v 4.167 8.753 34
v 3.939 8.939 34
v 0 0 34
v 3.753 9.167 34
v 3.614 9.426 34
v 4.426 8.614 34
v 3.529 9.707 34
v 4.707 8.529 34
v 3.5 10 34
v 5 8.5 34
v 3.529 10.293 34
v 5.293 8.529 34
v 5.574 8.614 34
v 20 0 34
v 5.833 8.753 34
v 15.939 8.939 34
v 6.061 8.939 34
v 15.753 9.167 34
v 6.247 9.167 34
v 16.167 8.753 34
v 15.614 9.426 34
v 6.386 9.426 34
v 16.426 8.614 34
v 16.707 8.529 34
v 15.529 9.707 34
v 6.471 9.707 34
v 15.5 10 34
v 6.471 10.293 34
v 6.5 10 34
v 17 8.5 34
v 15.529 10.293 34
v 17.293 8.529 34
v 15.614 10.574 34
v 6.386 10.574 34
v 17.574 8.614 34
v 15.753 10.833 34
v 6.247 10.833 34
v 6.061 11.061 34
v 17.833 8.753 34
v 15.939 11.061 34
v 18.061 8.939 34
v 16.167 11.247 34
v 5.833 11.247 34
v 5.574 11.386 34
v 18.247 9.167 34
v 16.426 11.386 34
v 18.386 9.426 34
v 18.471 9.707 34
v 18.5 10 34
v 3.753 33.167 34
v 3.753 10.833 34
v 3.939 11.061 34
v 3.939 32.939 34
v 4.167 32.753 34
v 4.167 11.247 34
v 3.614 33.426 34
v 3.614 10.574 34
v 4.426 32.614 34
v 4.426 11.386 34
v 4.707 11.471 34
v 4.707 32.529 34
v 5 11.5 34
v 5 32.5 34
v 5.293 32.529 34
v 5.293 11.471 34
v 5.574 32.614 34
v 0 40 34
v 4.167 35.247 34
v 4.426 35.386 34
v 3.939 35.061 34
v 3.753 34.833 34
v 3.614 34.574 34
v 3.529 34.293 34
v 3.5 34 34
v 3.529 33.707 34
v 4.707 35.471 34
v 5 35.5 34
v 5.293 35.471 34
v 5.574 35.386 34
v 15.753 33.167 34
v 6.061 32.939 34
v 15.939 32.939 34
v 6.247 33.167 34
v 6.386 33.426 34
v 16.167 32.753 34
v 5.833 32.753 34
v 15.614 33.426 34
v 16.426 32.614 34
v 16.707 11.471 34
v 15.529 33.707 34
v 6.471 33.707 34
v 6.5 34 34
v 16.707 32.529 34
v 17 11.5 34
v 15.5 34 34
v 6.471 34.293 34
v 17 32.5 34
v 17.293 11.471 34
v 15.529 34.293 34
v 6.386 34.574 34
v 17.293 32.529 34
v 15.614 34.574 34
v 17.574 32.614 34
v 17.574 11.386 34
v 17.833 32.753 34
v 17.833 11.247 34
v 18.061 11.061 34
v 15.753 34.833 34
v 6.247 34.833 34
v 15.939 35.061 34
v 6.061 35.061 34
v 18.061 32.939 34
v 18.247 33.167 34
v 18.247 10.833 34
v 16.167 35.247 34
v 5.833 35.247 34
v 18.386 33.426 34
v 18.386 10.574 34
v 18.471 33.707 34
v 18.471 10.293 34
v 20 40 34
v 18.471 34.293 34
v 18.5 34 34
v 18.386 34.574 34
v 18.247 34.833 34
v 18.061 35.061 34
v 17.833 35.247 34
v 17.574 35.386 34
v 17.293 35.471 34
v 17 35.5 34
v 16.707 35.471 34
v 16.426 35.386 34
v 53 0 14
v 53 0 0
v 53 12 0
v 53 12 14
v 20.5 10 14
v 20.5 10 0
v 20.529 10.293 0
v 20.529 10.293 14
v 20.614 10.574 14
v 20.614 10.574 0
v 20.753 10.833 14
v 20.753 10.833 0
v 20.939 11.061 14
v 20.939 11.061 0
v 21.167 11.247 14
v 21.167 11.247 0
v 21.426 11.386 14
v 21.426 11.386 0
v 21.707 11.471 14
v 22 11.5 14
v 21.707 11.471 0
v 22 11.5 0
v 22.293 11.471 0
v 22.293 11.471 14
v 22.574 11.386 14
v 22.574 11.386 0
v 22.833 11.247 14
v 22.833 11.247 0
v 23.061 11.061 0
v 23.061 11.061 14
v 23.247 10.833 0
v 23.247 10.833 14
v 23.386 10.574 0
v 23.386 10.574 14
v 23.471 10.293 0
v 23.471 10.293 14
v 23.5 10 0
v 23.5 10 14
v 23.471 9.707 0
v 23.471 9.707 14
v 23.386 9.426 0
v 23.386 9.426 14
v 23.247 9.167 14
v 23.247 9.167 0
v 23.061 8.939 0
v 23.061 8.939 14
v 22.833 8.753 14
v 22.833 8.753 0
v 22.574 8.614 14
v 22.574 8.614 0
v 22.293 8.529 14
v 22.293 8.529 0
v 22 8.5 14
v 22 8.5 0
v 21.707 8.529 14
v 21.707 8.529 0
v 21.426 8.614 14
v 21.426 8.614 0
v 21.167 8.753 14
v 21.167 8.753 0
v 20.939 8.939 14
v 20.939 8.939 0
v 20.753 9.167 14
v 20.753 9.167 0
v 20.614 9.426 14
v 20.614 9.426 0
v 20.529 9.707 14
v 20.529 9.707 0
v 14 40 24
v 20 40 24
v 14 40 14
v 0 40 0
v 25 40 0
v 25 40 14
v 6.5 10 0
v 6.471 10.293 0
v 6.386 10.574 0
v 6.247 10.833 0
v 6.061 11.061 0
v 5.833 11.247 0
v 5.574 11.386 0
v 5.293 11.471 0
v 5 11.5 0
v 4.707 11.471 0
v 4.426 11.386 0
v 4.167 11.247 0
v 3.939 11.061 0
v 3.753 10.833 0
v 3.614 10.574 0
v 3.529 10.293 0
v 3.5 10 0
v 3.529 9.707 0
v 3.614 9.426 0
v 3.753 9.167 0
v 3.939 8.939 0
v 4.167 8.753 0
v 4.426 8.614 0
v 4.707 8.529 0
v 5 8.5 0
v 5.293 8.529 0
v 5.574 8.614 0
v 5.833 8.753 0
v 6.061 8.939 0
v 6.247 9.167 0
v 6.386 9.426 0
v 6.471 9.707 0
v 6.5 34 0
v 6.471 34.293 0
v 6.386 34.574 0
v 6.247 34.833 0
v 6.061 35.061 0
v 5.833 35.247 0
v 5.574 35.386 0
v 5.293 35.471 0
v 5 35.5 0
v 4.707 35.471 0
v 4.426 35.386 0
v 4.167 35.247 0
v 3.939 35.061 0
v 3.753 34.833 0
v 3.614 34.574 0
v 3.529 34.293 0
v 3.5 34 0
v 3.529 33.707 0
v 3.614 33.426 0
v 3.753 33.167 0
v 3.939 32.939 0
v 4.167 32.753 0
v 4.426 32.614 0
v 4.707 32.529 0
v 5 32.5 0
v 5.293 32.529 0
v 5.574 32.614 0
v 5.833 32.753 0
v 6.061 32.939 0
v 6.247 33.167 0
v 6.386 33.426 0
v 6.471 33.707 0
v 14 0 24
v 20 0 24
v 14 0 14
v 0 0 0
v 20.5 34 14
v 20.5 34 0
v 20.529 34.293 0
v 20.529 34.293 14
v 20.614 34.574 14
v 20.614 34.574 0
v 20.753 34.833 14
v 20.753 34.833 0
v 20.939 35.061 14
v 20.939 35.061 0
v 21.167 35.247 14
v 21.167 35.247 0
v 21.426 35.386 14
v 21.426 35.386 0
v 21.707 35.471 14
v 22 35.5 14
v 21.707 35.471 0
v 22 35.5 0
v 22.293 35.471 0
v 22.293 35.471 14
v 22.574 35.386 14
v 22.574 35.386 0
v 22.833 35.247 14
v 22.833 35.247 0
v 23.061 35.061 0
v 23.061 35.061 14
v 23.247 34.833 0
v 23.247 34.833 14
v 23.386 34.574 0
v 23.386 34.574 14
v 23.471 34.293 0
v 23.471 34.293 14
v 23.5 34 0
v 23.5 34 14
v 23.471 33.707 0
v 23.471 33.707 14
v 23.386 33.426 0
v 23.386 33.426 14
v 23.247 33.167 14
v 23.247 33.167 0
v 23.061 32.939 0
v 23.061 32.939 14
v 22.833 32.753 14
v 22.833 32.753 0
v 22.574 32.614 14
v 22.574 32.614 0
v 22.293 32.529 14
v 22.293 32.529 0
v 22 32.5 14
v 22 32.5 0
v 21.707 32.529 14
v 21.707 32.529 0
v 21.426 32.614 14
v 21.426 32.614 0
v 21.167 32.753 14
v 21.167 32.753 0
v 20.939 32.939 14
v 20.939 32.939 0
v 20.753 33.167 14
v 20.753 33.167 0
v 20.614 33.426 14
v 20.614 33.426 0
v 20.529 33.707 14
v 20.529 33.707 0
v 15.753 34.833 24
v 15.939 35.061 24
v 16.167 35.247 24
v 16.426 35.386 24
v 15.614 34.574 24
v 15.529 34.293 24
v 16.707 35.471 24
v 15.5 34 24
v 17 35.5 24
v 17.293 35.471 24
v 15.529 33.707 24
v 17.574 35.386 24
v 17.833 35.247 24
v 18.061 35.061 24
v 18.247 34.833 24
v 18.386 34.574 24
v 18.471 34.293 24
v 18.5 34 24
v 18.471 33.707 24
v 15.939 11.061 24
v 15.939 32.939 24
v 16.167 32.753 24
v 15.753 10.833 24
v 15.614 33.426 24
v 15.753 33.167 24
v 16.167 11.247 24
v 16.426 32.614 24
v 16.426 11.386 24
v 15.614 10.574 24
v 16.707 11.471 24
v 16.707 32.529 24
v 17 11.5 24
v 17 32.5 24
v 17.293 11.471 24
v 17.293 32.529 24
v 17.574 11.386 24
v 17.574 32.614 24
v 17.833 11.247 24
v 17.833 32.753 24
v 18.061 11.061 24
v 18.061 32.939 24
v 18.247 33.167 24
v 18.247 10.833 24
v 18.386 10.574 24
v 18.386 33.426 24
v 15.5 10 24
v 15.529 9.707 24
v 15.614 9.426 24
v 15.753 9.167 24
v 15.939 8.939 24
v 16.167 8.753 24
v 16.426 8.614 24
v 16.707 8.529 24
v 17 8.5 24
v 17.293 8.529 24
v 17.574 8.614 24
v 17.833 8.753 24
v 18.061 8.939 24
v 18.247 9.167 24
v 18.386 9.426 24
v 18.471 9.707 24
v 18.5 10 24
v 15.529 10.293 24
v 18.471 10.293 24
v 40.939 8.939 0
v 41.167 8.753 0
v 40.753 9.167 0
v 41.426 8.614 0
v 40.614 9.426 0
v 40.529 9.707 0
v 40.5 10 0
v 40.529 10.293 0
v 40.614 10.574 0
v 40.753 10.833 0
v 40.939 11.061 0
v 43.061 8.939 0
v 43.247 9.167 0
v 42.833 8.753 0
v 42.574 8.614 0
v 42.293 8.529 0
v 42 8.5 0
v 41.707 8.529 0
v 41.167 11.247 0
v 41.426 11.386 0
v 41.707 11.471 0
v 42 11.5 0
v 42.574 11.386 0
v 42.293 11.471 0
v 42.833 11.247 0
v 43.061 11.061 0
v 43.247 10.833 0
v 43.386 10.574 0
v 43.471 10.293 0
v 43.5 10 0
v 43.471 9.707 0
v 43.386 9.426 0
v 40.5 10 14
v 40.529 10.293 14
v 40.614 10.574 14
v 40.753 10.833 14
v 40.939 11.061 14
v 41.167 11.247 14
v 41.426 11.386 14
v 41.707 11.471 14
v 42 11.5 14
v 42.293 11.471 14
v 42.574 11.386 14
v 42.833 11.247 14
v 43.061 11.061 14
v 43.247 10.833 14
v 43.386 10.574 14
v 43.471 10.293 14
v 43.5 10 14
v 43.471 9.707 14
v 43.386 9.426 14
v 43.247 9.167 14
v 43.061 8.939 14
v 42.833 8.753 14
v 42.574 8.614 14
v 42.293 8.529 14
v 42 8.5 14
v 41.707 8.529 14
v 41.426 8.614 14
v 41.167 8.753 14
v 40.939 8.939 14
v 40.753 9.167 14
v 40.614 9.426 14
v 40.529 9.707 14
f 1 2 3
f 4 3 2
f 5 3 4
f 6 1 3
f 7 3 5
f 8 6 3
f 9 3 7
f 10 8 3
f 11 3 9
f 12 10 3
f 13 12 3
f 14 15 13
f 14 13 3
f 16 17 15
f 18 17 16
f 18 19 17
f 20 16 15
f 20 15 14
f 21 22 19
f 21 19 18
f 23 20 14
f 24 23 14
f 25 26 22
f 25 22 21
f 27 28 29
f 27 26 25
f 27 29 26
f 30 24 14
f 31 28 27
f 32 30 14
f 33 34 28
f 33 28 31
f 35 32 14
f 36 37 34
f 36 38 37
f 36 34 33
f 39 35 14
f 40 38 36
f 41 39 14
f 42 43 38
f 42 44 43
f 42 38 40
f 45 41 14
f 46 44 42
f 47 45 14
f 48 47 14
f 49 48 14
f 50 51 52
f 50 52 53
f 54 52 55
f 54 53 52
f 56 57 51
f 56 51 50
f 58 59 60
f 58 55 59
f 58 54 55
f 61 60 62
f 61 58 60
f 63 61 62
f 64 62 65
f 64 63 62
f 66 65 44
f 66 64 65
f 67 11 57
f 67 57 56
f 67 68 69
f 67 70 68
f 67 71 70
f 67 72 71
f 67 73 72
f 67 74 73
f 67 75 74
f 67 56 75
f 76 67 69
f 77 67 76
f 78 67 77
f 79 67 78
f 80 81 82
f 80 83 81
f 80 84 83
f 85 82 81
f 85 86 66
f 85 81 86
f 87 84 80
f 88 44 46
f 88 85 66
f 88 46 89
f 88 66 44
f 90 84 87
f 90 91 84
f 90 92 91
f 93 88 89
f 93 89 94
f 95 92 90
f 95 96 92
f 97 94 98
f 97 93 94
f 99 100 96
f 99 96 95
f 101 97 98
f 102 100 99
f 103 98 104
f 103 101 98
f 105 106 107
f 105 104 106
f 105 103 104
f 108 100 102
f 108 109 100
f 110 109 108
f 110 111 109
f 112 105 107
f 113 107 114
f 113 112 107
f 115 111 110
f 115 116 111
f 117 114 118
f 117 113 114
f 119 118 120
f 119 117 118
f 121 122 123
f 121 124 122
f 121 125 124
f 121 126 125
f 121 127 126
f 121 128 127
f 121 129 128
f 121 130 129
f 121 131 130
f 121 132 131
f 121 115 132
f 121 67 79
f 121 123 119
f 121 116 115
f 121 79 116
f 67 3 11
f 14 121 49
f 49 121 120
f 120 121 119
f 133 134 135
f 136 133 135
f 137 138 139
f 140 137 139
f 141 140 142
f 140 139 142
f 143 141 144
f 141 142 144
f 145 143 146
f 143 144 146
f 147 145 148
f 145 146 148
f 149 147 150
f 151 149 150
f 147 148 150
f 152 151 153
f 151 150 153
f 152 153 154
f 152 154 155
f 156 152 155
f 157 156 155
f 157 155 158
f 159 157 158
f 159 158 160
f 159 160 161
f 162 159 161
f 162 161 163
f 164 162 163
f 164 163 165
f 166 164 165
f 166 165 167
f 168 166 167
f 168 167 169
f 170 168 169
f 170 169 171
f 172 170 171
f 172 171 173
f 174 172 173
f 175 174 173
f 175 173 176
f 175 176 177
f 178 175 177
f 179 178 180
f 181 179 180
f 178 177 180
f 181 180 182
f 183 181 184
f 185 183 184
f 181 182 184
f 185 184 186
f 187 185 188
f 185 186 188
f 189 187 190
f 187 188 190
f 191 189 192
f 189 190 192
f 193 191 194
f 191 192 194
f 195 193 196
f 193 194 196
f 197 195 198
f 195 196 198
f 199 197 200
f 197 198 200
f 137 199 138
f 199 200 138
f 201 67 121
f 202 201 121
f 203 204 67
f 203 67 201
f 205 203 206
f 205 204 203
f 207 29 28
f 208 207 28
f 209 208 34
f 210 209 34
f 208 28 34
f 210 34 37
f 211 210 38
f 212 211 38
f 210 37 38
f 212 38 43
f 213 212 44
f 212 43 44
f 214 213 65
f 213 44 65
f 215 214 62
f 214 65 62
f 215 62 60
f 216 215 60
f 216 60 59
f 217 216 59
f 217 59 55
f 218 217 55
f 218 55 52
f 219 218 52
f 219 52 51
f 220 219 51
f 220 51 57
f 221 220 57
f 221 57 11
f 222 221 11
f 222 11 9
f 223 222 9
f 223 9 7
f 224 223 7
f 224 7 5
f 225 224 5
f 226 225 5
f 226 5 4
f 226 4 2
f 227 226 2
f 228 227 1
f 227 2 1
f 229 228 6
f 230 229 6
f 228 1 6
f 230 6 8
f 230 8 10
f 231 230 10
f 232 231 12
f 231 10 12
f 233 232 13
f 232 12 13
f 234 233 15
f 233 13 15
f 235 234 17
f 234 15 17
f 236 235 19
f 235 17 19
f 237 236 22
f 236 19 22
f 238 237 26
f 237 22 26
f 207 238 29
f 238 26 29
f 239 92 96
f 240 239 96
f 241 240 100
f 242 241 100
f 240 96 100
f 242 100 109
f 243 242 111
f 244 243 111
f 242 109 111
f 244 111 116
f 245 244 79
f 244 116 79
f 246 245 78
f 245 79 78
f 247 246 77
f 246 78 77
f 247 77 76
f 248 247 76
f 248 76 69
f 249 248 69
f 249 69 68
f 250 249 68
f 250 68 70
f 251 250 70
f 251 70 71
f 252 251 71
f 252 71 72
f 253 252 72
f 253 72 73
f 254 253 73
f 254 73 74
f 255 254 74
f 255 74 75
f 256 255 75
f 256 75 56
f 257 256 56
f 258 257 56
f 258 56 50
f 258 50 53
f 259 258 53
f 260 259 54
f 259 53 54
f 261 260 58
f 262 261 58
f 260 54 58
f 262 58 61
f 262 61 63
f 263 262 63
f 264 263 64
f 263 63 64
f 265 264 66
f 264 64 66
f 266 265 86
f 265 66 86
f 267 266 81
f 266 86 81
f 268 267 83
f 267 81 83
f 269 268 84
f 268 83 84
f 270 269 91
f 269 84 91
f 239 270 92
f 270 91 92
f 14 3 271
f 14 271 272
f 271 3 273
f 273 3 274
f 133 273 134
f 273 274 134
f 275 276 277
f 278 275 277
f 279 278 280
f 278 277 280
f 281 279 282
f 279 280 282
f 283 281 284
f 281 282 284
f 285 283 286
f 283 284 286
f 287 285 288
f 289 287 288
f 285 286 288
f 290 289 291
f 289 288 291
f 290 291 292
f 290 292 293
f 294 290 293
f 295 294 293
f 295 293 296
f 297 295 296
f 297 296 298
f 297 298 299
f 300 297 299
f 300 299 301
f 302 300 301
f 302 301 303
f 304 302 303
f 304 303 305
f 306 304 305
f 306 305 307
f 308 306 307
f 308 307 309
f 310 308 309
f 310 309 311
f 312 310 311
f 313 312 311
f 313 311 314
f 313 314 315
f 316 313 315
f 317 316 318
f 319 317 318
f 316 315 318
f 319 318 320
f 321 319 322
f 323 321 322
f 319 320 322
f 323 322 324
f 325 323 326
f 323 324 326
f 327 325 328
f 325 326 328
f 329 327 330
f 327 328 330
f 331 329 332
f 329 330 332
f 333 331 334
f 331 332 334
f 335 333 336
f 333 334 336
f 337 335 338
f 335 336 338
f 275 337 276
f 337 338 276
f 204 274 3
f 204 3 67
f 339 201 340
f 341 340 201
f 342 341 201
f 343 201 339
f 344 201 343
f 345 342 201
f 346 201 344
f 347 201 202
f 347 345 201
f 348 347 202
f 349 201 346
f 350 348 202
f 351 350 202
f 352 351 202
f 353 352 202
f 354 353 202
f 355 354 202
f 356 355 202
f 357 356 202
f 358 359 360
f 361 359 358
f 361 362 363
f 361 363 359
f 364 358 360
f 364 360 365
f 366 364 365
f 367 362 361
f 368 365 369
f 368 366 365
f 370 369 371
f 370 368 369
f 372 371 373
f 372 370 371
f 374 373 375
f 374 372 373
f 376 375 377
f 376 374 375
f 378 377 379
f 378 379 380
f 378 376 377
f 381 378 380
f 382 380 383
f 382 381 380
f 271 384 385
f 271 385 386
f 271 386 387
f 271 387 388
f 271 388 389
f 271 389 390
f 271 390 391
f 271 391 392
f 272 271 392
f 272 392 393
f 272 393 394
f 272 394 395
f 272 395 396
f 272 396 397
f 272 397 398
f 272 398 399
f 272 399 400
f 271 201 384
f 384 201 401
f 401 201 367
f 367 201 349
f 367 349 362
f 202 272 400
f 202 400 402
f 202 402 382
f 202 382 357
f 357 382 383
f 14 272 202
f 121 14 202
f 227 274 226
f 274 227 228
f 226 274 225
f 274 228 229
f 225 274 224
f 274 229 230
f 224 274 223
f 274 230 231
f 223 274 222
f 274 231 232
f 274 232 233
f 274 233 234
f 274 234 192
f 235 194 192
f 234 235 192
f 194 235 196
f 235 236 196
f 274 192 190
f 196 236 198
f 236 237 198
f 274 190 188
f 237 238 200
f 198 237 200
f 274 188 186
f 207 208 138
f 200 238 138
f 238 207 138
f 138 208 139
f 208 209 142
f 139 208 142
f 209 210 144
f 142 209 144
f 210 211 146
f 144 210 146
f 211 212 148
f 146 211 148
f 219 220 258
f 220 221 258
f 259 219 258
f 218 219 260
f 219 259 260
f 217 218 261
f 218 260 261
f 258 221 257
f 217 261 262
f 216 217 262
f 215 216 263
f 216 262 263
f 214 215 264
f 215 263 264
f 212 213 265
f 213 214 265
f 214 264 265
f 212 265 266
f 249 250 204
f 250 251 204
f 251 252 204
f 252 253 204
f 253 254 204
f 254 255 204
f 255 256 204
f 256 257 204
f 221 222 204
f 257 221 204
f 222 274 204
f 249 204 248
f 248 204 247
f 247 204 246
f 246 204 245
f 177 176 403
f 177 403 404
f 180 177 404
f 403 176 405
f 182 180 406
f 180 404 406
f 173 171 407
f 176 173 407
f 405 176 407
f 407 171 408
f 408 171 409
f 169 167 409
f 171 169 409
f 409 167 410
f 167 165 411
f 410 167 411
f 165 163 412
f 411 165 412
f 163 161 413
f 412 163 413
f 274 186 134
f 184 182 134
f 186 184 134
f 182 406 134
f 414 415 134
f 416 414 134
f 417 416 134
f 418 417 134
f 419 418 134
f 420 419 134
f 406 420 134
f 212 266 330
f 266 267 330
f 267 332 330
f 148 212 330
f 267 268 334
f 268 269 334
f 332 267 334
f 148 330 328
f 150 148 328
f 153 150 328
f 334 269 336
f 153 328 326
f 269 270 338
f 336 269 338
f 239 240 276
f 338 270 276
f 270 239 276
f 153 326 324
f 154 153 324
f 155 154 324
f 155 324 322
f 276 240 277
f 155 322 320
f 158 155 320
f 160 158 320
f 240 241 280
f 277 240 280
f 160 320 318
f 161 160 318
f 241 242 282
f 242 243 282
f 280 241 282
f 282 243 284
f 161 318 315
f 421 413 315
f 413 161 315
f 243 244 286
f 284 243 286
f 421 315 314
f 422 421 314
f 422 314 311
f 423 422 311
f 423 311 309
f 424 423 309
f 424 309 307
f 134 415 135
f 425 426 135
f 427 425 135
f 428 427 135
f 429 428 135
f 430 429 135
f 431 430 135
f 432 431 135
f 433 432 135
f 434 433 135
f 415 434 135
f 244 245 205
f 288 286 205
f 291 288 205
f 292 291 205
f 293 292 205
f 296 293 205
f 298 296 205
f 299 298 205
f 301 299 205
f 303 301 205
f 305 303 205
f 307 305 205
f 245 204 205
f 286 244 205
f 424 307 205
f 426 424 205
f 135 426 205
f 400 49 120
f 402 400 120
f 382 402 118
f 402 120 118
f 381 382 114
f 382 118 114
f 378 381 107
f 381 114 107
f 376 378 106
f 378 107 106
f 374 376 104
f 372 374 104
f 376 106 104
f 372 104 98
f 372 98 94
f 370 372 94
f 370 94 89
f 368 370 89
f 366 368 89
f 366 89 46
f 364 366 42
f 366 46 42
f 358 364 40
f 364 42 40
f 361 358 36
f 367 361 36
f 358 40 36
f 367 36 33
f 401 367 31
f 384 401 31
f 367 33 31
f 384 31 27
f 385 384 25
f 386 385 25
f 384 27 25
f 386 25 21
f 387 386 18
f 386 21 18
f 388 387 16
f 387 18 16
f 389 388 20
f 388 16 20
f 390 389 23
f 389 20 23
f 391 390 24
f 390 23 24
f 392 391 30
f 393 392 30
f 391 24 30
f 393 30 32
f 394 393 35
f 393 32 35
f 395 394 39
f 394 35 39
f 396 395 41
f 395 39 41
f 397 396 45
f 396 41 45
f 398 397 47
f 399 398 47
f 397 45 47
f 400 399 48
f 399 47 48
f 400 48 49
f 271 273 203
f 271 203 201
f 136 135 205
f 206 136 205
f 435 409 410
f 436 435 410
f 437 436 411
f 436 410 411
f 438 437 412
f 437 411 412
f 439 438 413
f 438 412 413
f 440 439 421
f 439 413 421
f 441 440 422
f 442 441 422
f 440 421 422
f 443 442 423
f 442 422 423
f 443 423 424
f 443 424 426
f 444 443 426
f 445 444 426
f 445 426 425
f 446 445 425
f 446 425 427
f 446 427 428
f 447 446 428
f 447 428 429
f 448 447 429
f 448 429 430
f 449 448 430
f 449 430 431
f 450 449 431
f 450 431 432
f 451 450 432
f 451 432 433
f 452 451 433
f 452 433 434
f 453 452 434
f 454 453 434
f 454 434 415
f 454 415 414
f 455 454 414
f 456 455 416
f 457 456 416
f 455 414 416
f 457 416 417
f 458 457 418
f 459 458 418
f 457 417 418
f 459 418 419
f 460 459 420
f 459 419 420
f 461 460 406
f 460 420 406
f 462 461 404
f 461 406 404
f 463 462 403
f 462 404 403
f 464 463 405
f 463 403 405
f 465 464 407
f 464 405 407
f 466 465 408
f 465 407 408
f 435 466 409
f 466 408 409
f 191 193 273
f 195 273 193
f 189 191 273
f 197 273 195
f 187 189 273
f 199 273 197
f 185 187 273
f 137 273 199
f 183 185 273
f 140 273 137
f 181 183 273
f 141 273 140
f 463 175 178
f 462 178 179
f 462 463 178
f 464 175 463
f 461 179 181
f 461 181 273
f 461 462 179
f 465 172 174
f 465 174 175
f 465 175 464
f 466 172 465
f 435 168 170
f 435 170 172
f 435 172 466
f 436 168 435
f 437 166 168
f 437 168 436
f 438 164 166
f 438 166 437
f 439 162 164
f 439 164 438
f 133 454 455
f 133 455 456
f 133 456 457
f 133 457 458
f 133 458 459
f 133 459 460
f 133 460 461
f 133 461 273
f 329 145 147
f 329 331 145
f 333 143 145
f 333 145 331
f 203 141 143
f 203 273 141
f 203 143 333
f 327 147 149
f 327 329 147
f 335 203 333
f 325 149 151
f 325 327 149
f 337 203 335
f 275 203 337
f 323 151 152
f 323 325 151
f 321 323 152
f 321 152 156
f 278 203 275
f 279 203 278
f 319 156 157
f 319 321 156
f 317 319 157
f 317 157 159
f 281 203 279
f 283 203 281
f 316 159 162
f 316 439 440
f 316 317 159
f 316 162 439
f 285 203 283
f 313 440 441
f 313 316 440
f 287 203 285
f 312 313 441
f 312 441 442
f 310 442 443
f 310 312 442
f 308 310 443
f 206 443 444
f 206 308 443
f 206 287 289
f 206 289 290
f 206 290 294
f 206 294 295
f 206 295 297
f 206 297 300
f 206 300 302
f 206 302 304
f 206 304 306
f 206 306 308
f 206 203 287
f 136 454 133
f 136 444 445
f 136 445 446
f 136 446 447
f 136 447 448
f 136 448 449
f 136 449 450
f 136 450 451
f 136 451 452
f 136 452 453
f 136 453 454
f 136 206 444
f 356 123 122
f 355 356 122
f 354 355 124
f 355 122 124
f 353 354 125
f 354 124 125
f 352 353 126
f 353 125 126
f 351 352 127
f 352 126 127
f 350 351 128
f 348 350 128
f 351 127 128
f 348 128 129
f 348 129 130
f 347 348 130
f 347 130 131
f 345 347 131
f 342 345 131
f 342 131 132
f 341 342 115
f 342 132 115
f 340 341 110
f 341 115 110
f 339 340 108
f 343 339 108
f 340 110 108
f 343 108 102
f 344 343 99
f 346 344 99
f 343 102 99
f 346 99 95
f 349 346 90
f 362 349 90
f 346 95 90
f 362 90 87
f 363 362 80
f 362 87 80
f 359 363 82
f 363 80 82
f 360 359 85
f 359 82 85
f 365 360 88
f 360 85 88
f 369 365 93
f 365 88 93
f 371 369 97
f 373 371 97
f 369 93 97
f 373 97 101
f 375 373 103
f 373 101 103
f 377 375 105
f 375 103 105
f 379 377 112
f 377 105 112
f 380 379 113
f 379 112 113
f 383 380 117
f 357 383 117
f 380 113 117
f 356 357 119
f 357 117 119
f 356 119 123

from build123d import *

# Parameters (mm, degrees)
SKETCH_1_W          = 20
SKETCH_1_H          = 40
EXTRUDE_1_DEPTH     = 34
SKETCH_2_R          = 1.5
CUT_EXTRUDE_1_DEPTH = 57.178287621
EXTRUDE_START       = -34
SKETCH_3_W          = 33
SKETCH_3_H          = 40
EXTRUDE_2_DEPTH     = 14
CUT_EXTRUDE_2_DEPTH = 75.598927606
SKETCH_5_R          = 1.5
CUT_EXTRUDE_3_DEPTH = 75.598927606
SKETCH_6_W          = 6
SKETCH_6_H          = 10
CUT_EXTRUDE_4_DEPTH = 75.598927606
SKETCH_7_R          = 1.5
CUT_EXTRUDE_5_DEPTH = 10


with BuildPart() as part:
    # 草图1 → 凸台-拉伸1 (new body)
    with BuildSketch(Plane.XY):
        with Locations((10, 20)):
            Rectangle(SKETCH_1_W, SKETCH_1_H)
    extrude(amount=EXTRUDE_1_DEPTH)

    # 草图2 → 切除-拉伸1 (cut, through all)
    with BuildSketch(Plane.XY.offset(34)):
        with Locations((5, 34)):
            Circle(SKETCH_2_R)
        with Locations((5, 10)):
            Circle(SKETCH_2_R)
    extrude(amount=-CUT_EXTRUDE_1_DEPTH, mode=Mode.SUBTRACT)

    # 草图3 → 凸台-拉伸2 (add)
    with BuildSketch(Plane.XY.offset(34).offset(EXTRUDE_START)):
        with Locations((36.5, 20)):
            Rectangle(SKETCH_3_W, SKETCH_3_H)
    extrude(amount=EXTRUDE_2_DEPTH)

    # 草图4 → 切除-拉伸2 (cut, through all)
    with BuildSketch(Plane(origin=(0, 0, 0), x_dir=(-1, 0, 0), z_dir=(0, 0, -1))):
        Polygon((-25, 40), (-53, 40), (-53, 12), align=None)
    extrude(amount=-CUT_EXTRUDE_2_DEPTH, mode=Mode.SUBTRACT)

    # 草图5 → 切除-拉伸3 (cut, through all)
    with BuildSketch(Plane(origin=(0, 0, 0), x_dir=(-1, 0, 0), z_dir=(0, 0, -1))):
        with Locations((-22, 34)):
            Circle(SKETCH_5_R)
        with Locations((-22, 10)):
            Circle(SKETCH_5_R)
        with Locations((-42, 10)):
            Circle(SKETCH_5_R)
    extrude(amount=-CUT_EXTRUDE_3_DEPTH, mode=Mode.SUBTRACT)

    # 草图6 → 切除-拉伸4 (cut, through all)
    with BuildSketch(Plane.XZ):
        with Locations((17, 19)):
            Rectangle(SKETCH_6_W, SKETCH_6_H)
    extrude(amount=-CUT_EXTRUDE_4_DEPTH, mode=Mode.SUBTRACT)

    # 草图7 → 切除-拉伸5 (cut)
    with BuildSketch(Plane.XY.offset(34)):
        with Locations((17, 34)):
            Circle(SKETCH_7_R)
        with Locations((17, 10)):
            Circle(SKETCH_7_R)
    extrude(amount=-CUT_EXTRUDE_5_DEPTH, mode=Mode.SUBTRACT)


solid = part.part
